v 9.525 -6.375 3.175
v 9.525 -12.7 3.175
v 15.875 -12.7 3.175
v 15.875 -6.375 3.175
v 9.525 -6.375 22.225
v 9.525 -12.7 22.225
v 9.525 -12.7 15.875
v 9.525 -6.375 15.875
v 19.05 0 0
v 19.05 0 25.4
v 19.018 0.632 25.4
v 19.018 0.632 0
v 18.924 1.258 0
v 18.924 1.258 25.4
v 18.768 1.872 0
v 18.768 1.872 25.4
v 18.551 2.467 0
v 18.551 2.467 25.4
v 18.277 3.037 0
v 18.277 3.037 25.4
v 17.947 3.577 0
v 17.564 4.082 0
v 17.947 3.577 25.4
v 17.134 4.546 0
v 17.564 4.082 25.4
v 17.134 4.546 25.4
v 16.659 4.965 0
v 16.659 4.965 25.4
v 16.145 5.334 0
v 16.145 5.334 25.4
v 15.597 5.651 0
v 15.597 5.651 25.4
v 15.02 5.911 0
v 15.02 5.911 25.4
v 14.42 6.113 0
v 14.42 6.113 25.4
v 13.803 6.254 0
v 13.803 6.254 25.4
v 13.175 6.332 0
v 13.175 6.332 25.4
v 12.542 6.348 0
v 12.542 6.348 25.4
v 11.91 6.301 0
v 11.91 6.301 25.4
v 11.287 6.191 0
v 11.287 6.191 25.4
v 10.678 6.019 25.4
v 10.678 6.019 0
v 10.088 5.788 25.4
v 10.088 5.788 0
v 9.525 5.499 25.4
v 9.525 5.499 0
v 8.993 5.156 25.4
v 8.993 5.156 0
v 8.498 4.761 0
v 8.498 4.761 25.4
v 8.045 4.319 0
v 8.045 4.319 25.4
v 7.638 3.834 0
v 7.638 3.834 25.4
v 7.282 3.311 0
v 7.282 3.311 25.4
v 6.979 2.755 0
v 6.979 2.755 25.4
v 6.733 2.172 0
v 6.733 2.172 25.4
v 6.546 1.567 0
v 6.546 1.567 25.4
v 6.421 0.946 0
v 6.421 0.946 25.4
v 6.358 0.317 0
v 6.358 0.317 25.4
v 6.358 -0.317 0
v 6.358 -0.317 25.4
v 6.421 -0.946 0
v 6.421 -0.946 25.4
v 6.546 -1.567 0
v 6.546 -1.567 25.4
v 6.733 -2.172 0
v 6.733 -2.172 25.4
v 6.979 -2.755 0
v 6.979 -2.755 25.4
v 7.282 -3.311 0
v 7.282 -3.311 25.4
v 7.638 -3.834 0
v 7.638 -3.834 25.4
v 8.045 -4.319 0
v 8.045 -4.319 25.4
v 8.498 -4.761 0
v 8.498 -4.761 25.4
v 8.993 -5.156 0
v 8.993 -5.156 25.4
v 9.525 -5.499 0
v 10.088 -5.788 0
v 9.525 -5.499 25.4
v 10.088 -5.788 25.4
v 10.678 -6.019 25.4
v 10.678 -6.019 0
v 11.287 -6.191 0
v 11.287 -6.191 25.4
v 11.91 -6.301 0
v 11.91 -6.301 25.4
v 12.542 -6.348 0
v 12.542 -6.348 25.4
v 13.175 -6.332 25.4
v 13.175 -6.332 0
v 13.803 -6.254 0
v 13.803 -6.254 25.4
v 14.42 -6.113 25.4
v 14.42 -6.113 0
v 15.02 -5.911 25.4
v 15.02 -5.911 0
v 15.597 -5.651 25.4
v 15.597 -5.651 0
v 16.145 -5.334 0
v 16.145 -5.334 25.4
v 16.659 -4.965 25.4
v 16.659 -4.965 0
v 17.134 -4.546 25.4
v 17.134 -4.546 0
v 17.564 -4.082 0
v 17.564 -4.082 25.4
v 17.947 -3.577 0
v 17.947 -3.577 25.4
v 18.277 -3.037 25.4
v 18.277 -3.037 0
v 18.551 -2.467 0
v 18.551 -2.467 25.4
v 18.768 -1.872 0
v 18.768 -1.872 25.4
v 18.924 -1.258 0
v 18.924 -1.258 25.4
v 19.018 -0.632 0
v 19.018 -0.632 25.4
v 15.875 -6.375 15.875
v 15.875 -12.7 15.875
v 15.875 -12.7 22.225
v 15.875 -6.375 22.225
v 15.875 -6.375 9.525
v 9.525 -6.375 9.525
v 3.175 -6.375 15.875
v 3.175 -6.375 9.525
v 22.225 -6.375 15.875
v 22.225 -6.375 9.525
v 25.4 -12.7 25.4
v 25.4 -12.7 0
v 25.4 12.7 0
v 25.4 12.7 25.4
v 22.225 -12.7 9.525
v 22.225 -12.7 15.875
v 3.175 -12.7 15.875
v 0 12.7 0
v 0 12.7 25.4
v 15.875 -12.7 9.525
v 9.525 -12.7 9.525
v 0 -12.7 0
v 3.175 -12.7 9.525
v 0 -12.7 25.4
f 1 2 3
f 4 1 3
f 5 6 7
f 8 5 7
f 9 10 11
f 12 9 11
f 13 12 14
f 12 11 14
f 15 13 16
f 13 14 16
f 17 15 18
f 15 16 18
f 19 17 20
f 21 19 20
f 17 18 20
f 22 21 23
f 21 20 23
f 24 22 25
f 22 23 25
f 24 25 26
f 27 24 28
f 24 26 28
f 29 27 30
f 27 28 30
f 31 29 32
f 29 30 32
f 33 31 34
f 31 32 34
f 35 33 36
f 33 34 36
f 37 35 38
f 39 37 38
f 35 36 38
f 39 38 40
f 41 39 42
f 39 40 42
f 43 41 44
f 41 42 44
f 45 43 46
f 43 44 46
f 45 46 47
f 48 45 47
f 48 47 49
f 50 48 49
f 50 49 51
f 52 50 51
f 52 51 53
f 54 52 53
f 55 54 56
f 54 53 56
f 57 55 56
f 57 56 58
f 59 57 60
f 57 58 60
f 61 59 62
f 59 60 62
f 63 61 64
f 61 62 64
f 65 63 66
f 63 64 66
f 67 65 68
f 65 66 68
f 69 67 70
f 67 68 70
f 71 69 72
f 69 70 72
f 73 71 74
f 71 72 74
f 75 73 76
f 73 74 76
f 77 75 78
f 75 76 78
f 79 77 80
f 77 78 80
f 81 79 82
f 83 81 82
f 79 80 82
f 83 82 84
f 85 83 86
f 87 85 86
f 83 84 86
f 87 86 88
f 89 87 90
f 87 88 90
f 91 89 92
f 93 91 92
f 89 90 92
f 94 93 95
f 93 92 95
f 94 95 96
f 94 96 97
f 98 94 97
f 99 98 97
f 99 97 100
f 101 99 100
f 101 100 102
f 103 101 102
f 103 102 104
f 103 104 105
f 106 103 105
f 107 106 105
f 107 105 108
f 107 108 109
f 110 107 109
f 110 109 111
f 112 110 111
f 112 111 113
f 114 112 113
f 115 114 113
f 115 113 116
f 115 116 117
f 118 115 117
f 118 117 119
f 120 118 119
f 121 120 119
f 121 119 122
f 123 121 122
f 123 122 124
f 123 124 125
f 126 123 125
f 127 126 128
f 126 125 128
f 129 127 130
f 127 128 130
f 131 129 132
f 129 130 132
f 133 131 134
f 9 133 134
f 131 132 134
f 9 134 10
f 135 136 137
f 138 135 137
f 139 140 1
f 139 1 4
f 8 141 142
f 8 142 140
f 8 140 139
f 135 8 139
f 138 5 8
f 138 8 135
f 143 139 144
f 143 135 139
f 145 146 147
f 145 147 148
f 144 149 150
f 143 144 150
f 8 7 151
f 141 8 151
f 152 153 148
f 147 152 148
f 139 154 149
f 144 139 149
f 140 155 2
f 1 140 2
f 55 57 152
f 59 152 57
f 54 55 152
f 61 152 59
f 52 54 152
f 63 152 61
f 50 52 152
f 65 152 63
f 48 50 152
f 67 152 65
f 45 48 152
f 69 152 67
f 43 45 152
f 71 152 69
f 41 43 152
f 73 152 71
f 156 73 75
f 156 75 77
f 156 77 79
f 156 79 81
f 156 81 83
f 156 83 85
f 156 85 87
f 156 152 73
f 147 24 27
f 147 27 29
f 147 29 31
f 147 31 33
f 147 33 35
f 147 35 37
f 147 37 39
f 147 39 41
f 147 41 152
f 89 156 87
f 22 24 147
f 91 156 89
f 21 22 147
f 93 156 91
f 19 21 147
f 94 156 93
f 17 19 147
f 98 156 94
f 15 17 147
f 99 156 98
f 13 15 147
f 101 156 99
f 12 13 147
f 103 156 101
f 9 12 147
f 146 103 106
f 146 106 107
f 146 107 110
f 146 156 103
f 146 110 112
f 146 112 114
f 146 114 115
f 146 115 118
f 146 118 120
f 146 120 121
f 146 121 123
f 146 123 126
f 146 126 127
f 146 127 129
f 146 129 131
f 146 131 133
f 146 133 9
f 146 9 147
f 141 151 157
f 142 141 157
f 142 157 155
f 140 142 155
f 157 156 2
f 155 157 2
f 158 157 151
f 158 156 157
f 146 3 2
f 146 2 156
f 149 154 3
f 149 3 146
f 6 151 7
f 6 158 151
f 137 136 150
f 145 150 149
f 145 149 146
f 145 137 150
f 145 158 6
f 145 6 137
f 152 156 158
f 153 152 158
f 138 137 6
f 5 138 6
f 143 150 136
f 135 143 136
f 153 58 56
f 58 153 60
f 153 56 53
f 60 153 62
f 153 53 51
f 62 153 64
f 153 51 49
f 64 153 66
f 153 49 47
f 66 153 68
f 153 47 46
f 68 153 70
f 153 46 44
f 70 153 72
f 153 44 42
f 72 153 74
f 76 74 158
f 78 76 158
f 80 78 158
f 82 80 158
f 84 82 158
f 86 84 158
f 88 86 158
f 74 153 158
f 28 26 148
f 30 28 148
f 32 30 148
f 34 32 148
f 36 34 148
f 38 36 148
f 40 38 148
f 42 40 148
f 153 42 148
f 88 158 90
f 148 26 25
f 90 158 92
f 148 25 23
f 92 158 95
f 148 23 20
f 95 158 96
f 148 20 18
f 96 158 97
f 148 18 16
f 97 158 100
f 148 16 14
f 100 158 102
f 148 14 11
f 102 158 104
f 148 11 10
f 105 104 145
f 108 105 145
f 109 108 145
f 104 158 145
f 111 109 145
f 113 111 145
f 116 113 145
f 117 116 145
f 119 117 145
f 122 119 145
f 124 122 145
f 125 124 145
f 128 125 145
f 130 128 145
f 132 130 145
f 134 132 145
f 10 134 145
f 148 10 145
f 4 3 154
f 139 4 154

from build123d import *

# Parameters (mm, degrees)
F0_W     = 25.4
F0_H     = 25.4
F1_DEPTH = 12.7
F2_R     = 6.35
F3_DEPTH = 25.4
F5_DEPTH = 6.3246


with BuildPart() as f1:
    # F0 (on Front) → F1 (new body, symmetric)
    with BuildSketch(Plane.XZ):
        with Locations((12.7, 12.7)):
            Rectangle(F0_W, F0_H)
    extrude(amount=F1_DEPTH, both=True)

    # F2 (on face) → F3 (cut, through all)
    with BuildSketch(Plane.XY.offset(25.4)):
        with Locations((12.7, 0)):
            Circle(F2_R)
    extrude(amount=-F3_DEPTH, mode=Mode.SUBTRACT)

    # F4 (on face) → F5 (cut)
    with BuildSketch(Plane.XZ.offset(12.7)):
        Polygon((15.875, 22.225), (9.525, 22.225), (9.525, 15.875), (3.175, 15.875), (3.175, 9.525), (9.525, 9.525), (9.525, 3.175), (15.875, 3.175), (15.875, 9.525), (22.225, 9.525), (22.225, 15.875), (15.875, 15.875), align=None)
    extrude(amount=-F5_DEPTH, mode=Mode.SUBTRACT)


solid = f1.part
